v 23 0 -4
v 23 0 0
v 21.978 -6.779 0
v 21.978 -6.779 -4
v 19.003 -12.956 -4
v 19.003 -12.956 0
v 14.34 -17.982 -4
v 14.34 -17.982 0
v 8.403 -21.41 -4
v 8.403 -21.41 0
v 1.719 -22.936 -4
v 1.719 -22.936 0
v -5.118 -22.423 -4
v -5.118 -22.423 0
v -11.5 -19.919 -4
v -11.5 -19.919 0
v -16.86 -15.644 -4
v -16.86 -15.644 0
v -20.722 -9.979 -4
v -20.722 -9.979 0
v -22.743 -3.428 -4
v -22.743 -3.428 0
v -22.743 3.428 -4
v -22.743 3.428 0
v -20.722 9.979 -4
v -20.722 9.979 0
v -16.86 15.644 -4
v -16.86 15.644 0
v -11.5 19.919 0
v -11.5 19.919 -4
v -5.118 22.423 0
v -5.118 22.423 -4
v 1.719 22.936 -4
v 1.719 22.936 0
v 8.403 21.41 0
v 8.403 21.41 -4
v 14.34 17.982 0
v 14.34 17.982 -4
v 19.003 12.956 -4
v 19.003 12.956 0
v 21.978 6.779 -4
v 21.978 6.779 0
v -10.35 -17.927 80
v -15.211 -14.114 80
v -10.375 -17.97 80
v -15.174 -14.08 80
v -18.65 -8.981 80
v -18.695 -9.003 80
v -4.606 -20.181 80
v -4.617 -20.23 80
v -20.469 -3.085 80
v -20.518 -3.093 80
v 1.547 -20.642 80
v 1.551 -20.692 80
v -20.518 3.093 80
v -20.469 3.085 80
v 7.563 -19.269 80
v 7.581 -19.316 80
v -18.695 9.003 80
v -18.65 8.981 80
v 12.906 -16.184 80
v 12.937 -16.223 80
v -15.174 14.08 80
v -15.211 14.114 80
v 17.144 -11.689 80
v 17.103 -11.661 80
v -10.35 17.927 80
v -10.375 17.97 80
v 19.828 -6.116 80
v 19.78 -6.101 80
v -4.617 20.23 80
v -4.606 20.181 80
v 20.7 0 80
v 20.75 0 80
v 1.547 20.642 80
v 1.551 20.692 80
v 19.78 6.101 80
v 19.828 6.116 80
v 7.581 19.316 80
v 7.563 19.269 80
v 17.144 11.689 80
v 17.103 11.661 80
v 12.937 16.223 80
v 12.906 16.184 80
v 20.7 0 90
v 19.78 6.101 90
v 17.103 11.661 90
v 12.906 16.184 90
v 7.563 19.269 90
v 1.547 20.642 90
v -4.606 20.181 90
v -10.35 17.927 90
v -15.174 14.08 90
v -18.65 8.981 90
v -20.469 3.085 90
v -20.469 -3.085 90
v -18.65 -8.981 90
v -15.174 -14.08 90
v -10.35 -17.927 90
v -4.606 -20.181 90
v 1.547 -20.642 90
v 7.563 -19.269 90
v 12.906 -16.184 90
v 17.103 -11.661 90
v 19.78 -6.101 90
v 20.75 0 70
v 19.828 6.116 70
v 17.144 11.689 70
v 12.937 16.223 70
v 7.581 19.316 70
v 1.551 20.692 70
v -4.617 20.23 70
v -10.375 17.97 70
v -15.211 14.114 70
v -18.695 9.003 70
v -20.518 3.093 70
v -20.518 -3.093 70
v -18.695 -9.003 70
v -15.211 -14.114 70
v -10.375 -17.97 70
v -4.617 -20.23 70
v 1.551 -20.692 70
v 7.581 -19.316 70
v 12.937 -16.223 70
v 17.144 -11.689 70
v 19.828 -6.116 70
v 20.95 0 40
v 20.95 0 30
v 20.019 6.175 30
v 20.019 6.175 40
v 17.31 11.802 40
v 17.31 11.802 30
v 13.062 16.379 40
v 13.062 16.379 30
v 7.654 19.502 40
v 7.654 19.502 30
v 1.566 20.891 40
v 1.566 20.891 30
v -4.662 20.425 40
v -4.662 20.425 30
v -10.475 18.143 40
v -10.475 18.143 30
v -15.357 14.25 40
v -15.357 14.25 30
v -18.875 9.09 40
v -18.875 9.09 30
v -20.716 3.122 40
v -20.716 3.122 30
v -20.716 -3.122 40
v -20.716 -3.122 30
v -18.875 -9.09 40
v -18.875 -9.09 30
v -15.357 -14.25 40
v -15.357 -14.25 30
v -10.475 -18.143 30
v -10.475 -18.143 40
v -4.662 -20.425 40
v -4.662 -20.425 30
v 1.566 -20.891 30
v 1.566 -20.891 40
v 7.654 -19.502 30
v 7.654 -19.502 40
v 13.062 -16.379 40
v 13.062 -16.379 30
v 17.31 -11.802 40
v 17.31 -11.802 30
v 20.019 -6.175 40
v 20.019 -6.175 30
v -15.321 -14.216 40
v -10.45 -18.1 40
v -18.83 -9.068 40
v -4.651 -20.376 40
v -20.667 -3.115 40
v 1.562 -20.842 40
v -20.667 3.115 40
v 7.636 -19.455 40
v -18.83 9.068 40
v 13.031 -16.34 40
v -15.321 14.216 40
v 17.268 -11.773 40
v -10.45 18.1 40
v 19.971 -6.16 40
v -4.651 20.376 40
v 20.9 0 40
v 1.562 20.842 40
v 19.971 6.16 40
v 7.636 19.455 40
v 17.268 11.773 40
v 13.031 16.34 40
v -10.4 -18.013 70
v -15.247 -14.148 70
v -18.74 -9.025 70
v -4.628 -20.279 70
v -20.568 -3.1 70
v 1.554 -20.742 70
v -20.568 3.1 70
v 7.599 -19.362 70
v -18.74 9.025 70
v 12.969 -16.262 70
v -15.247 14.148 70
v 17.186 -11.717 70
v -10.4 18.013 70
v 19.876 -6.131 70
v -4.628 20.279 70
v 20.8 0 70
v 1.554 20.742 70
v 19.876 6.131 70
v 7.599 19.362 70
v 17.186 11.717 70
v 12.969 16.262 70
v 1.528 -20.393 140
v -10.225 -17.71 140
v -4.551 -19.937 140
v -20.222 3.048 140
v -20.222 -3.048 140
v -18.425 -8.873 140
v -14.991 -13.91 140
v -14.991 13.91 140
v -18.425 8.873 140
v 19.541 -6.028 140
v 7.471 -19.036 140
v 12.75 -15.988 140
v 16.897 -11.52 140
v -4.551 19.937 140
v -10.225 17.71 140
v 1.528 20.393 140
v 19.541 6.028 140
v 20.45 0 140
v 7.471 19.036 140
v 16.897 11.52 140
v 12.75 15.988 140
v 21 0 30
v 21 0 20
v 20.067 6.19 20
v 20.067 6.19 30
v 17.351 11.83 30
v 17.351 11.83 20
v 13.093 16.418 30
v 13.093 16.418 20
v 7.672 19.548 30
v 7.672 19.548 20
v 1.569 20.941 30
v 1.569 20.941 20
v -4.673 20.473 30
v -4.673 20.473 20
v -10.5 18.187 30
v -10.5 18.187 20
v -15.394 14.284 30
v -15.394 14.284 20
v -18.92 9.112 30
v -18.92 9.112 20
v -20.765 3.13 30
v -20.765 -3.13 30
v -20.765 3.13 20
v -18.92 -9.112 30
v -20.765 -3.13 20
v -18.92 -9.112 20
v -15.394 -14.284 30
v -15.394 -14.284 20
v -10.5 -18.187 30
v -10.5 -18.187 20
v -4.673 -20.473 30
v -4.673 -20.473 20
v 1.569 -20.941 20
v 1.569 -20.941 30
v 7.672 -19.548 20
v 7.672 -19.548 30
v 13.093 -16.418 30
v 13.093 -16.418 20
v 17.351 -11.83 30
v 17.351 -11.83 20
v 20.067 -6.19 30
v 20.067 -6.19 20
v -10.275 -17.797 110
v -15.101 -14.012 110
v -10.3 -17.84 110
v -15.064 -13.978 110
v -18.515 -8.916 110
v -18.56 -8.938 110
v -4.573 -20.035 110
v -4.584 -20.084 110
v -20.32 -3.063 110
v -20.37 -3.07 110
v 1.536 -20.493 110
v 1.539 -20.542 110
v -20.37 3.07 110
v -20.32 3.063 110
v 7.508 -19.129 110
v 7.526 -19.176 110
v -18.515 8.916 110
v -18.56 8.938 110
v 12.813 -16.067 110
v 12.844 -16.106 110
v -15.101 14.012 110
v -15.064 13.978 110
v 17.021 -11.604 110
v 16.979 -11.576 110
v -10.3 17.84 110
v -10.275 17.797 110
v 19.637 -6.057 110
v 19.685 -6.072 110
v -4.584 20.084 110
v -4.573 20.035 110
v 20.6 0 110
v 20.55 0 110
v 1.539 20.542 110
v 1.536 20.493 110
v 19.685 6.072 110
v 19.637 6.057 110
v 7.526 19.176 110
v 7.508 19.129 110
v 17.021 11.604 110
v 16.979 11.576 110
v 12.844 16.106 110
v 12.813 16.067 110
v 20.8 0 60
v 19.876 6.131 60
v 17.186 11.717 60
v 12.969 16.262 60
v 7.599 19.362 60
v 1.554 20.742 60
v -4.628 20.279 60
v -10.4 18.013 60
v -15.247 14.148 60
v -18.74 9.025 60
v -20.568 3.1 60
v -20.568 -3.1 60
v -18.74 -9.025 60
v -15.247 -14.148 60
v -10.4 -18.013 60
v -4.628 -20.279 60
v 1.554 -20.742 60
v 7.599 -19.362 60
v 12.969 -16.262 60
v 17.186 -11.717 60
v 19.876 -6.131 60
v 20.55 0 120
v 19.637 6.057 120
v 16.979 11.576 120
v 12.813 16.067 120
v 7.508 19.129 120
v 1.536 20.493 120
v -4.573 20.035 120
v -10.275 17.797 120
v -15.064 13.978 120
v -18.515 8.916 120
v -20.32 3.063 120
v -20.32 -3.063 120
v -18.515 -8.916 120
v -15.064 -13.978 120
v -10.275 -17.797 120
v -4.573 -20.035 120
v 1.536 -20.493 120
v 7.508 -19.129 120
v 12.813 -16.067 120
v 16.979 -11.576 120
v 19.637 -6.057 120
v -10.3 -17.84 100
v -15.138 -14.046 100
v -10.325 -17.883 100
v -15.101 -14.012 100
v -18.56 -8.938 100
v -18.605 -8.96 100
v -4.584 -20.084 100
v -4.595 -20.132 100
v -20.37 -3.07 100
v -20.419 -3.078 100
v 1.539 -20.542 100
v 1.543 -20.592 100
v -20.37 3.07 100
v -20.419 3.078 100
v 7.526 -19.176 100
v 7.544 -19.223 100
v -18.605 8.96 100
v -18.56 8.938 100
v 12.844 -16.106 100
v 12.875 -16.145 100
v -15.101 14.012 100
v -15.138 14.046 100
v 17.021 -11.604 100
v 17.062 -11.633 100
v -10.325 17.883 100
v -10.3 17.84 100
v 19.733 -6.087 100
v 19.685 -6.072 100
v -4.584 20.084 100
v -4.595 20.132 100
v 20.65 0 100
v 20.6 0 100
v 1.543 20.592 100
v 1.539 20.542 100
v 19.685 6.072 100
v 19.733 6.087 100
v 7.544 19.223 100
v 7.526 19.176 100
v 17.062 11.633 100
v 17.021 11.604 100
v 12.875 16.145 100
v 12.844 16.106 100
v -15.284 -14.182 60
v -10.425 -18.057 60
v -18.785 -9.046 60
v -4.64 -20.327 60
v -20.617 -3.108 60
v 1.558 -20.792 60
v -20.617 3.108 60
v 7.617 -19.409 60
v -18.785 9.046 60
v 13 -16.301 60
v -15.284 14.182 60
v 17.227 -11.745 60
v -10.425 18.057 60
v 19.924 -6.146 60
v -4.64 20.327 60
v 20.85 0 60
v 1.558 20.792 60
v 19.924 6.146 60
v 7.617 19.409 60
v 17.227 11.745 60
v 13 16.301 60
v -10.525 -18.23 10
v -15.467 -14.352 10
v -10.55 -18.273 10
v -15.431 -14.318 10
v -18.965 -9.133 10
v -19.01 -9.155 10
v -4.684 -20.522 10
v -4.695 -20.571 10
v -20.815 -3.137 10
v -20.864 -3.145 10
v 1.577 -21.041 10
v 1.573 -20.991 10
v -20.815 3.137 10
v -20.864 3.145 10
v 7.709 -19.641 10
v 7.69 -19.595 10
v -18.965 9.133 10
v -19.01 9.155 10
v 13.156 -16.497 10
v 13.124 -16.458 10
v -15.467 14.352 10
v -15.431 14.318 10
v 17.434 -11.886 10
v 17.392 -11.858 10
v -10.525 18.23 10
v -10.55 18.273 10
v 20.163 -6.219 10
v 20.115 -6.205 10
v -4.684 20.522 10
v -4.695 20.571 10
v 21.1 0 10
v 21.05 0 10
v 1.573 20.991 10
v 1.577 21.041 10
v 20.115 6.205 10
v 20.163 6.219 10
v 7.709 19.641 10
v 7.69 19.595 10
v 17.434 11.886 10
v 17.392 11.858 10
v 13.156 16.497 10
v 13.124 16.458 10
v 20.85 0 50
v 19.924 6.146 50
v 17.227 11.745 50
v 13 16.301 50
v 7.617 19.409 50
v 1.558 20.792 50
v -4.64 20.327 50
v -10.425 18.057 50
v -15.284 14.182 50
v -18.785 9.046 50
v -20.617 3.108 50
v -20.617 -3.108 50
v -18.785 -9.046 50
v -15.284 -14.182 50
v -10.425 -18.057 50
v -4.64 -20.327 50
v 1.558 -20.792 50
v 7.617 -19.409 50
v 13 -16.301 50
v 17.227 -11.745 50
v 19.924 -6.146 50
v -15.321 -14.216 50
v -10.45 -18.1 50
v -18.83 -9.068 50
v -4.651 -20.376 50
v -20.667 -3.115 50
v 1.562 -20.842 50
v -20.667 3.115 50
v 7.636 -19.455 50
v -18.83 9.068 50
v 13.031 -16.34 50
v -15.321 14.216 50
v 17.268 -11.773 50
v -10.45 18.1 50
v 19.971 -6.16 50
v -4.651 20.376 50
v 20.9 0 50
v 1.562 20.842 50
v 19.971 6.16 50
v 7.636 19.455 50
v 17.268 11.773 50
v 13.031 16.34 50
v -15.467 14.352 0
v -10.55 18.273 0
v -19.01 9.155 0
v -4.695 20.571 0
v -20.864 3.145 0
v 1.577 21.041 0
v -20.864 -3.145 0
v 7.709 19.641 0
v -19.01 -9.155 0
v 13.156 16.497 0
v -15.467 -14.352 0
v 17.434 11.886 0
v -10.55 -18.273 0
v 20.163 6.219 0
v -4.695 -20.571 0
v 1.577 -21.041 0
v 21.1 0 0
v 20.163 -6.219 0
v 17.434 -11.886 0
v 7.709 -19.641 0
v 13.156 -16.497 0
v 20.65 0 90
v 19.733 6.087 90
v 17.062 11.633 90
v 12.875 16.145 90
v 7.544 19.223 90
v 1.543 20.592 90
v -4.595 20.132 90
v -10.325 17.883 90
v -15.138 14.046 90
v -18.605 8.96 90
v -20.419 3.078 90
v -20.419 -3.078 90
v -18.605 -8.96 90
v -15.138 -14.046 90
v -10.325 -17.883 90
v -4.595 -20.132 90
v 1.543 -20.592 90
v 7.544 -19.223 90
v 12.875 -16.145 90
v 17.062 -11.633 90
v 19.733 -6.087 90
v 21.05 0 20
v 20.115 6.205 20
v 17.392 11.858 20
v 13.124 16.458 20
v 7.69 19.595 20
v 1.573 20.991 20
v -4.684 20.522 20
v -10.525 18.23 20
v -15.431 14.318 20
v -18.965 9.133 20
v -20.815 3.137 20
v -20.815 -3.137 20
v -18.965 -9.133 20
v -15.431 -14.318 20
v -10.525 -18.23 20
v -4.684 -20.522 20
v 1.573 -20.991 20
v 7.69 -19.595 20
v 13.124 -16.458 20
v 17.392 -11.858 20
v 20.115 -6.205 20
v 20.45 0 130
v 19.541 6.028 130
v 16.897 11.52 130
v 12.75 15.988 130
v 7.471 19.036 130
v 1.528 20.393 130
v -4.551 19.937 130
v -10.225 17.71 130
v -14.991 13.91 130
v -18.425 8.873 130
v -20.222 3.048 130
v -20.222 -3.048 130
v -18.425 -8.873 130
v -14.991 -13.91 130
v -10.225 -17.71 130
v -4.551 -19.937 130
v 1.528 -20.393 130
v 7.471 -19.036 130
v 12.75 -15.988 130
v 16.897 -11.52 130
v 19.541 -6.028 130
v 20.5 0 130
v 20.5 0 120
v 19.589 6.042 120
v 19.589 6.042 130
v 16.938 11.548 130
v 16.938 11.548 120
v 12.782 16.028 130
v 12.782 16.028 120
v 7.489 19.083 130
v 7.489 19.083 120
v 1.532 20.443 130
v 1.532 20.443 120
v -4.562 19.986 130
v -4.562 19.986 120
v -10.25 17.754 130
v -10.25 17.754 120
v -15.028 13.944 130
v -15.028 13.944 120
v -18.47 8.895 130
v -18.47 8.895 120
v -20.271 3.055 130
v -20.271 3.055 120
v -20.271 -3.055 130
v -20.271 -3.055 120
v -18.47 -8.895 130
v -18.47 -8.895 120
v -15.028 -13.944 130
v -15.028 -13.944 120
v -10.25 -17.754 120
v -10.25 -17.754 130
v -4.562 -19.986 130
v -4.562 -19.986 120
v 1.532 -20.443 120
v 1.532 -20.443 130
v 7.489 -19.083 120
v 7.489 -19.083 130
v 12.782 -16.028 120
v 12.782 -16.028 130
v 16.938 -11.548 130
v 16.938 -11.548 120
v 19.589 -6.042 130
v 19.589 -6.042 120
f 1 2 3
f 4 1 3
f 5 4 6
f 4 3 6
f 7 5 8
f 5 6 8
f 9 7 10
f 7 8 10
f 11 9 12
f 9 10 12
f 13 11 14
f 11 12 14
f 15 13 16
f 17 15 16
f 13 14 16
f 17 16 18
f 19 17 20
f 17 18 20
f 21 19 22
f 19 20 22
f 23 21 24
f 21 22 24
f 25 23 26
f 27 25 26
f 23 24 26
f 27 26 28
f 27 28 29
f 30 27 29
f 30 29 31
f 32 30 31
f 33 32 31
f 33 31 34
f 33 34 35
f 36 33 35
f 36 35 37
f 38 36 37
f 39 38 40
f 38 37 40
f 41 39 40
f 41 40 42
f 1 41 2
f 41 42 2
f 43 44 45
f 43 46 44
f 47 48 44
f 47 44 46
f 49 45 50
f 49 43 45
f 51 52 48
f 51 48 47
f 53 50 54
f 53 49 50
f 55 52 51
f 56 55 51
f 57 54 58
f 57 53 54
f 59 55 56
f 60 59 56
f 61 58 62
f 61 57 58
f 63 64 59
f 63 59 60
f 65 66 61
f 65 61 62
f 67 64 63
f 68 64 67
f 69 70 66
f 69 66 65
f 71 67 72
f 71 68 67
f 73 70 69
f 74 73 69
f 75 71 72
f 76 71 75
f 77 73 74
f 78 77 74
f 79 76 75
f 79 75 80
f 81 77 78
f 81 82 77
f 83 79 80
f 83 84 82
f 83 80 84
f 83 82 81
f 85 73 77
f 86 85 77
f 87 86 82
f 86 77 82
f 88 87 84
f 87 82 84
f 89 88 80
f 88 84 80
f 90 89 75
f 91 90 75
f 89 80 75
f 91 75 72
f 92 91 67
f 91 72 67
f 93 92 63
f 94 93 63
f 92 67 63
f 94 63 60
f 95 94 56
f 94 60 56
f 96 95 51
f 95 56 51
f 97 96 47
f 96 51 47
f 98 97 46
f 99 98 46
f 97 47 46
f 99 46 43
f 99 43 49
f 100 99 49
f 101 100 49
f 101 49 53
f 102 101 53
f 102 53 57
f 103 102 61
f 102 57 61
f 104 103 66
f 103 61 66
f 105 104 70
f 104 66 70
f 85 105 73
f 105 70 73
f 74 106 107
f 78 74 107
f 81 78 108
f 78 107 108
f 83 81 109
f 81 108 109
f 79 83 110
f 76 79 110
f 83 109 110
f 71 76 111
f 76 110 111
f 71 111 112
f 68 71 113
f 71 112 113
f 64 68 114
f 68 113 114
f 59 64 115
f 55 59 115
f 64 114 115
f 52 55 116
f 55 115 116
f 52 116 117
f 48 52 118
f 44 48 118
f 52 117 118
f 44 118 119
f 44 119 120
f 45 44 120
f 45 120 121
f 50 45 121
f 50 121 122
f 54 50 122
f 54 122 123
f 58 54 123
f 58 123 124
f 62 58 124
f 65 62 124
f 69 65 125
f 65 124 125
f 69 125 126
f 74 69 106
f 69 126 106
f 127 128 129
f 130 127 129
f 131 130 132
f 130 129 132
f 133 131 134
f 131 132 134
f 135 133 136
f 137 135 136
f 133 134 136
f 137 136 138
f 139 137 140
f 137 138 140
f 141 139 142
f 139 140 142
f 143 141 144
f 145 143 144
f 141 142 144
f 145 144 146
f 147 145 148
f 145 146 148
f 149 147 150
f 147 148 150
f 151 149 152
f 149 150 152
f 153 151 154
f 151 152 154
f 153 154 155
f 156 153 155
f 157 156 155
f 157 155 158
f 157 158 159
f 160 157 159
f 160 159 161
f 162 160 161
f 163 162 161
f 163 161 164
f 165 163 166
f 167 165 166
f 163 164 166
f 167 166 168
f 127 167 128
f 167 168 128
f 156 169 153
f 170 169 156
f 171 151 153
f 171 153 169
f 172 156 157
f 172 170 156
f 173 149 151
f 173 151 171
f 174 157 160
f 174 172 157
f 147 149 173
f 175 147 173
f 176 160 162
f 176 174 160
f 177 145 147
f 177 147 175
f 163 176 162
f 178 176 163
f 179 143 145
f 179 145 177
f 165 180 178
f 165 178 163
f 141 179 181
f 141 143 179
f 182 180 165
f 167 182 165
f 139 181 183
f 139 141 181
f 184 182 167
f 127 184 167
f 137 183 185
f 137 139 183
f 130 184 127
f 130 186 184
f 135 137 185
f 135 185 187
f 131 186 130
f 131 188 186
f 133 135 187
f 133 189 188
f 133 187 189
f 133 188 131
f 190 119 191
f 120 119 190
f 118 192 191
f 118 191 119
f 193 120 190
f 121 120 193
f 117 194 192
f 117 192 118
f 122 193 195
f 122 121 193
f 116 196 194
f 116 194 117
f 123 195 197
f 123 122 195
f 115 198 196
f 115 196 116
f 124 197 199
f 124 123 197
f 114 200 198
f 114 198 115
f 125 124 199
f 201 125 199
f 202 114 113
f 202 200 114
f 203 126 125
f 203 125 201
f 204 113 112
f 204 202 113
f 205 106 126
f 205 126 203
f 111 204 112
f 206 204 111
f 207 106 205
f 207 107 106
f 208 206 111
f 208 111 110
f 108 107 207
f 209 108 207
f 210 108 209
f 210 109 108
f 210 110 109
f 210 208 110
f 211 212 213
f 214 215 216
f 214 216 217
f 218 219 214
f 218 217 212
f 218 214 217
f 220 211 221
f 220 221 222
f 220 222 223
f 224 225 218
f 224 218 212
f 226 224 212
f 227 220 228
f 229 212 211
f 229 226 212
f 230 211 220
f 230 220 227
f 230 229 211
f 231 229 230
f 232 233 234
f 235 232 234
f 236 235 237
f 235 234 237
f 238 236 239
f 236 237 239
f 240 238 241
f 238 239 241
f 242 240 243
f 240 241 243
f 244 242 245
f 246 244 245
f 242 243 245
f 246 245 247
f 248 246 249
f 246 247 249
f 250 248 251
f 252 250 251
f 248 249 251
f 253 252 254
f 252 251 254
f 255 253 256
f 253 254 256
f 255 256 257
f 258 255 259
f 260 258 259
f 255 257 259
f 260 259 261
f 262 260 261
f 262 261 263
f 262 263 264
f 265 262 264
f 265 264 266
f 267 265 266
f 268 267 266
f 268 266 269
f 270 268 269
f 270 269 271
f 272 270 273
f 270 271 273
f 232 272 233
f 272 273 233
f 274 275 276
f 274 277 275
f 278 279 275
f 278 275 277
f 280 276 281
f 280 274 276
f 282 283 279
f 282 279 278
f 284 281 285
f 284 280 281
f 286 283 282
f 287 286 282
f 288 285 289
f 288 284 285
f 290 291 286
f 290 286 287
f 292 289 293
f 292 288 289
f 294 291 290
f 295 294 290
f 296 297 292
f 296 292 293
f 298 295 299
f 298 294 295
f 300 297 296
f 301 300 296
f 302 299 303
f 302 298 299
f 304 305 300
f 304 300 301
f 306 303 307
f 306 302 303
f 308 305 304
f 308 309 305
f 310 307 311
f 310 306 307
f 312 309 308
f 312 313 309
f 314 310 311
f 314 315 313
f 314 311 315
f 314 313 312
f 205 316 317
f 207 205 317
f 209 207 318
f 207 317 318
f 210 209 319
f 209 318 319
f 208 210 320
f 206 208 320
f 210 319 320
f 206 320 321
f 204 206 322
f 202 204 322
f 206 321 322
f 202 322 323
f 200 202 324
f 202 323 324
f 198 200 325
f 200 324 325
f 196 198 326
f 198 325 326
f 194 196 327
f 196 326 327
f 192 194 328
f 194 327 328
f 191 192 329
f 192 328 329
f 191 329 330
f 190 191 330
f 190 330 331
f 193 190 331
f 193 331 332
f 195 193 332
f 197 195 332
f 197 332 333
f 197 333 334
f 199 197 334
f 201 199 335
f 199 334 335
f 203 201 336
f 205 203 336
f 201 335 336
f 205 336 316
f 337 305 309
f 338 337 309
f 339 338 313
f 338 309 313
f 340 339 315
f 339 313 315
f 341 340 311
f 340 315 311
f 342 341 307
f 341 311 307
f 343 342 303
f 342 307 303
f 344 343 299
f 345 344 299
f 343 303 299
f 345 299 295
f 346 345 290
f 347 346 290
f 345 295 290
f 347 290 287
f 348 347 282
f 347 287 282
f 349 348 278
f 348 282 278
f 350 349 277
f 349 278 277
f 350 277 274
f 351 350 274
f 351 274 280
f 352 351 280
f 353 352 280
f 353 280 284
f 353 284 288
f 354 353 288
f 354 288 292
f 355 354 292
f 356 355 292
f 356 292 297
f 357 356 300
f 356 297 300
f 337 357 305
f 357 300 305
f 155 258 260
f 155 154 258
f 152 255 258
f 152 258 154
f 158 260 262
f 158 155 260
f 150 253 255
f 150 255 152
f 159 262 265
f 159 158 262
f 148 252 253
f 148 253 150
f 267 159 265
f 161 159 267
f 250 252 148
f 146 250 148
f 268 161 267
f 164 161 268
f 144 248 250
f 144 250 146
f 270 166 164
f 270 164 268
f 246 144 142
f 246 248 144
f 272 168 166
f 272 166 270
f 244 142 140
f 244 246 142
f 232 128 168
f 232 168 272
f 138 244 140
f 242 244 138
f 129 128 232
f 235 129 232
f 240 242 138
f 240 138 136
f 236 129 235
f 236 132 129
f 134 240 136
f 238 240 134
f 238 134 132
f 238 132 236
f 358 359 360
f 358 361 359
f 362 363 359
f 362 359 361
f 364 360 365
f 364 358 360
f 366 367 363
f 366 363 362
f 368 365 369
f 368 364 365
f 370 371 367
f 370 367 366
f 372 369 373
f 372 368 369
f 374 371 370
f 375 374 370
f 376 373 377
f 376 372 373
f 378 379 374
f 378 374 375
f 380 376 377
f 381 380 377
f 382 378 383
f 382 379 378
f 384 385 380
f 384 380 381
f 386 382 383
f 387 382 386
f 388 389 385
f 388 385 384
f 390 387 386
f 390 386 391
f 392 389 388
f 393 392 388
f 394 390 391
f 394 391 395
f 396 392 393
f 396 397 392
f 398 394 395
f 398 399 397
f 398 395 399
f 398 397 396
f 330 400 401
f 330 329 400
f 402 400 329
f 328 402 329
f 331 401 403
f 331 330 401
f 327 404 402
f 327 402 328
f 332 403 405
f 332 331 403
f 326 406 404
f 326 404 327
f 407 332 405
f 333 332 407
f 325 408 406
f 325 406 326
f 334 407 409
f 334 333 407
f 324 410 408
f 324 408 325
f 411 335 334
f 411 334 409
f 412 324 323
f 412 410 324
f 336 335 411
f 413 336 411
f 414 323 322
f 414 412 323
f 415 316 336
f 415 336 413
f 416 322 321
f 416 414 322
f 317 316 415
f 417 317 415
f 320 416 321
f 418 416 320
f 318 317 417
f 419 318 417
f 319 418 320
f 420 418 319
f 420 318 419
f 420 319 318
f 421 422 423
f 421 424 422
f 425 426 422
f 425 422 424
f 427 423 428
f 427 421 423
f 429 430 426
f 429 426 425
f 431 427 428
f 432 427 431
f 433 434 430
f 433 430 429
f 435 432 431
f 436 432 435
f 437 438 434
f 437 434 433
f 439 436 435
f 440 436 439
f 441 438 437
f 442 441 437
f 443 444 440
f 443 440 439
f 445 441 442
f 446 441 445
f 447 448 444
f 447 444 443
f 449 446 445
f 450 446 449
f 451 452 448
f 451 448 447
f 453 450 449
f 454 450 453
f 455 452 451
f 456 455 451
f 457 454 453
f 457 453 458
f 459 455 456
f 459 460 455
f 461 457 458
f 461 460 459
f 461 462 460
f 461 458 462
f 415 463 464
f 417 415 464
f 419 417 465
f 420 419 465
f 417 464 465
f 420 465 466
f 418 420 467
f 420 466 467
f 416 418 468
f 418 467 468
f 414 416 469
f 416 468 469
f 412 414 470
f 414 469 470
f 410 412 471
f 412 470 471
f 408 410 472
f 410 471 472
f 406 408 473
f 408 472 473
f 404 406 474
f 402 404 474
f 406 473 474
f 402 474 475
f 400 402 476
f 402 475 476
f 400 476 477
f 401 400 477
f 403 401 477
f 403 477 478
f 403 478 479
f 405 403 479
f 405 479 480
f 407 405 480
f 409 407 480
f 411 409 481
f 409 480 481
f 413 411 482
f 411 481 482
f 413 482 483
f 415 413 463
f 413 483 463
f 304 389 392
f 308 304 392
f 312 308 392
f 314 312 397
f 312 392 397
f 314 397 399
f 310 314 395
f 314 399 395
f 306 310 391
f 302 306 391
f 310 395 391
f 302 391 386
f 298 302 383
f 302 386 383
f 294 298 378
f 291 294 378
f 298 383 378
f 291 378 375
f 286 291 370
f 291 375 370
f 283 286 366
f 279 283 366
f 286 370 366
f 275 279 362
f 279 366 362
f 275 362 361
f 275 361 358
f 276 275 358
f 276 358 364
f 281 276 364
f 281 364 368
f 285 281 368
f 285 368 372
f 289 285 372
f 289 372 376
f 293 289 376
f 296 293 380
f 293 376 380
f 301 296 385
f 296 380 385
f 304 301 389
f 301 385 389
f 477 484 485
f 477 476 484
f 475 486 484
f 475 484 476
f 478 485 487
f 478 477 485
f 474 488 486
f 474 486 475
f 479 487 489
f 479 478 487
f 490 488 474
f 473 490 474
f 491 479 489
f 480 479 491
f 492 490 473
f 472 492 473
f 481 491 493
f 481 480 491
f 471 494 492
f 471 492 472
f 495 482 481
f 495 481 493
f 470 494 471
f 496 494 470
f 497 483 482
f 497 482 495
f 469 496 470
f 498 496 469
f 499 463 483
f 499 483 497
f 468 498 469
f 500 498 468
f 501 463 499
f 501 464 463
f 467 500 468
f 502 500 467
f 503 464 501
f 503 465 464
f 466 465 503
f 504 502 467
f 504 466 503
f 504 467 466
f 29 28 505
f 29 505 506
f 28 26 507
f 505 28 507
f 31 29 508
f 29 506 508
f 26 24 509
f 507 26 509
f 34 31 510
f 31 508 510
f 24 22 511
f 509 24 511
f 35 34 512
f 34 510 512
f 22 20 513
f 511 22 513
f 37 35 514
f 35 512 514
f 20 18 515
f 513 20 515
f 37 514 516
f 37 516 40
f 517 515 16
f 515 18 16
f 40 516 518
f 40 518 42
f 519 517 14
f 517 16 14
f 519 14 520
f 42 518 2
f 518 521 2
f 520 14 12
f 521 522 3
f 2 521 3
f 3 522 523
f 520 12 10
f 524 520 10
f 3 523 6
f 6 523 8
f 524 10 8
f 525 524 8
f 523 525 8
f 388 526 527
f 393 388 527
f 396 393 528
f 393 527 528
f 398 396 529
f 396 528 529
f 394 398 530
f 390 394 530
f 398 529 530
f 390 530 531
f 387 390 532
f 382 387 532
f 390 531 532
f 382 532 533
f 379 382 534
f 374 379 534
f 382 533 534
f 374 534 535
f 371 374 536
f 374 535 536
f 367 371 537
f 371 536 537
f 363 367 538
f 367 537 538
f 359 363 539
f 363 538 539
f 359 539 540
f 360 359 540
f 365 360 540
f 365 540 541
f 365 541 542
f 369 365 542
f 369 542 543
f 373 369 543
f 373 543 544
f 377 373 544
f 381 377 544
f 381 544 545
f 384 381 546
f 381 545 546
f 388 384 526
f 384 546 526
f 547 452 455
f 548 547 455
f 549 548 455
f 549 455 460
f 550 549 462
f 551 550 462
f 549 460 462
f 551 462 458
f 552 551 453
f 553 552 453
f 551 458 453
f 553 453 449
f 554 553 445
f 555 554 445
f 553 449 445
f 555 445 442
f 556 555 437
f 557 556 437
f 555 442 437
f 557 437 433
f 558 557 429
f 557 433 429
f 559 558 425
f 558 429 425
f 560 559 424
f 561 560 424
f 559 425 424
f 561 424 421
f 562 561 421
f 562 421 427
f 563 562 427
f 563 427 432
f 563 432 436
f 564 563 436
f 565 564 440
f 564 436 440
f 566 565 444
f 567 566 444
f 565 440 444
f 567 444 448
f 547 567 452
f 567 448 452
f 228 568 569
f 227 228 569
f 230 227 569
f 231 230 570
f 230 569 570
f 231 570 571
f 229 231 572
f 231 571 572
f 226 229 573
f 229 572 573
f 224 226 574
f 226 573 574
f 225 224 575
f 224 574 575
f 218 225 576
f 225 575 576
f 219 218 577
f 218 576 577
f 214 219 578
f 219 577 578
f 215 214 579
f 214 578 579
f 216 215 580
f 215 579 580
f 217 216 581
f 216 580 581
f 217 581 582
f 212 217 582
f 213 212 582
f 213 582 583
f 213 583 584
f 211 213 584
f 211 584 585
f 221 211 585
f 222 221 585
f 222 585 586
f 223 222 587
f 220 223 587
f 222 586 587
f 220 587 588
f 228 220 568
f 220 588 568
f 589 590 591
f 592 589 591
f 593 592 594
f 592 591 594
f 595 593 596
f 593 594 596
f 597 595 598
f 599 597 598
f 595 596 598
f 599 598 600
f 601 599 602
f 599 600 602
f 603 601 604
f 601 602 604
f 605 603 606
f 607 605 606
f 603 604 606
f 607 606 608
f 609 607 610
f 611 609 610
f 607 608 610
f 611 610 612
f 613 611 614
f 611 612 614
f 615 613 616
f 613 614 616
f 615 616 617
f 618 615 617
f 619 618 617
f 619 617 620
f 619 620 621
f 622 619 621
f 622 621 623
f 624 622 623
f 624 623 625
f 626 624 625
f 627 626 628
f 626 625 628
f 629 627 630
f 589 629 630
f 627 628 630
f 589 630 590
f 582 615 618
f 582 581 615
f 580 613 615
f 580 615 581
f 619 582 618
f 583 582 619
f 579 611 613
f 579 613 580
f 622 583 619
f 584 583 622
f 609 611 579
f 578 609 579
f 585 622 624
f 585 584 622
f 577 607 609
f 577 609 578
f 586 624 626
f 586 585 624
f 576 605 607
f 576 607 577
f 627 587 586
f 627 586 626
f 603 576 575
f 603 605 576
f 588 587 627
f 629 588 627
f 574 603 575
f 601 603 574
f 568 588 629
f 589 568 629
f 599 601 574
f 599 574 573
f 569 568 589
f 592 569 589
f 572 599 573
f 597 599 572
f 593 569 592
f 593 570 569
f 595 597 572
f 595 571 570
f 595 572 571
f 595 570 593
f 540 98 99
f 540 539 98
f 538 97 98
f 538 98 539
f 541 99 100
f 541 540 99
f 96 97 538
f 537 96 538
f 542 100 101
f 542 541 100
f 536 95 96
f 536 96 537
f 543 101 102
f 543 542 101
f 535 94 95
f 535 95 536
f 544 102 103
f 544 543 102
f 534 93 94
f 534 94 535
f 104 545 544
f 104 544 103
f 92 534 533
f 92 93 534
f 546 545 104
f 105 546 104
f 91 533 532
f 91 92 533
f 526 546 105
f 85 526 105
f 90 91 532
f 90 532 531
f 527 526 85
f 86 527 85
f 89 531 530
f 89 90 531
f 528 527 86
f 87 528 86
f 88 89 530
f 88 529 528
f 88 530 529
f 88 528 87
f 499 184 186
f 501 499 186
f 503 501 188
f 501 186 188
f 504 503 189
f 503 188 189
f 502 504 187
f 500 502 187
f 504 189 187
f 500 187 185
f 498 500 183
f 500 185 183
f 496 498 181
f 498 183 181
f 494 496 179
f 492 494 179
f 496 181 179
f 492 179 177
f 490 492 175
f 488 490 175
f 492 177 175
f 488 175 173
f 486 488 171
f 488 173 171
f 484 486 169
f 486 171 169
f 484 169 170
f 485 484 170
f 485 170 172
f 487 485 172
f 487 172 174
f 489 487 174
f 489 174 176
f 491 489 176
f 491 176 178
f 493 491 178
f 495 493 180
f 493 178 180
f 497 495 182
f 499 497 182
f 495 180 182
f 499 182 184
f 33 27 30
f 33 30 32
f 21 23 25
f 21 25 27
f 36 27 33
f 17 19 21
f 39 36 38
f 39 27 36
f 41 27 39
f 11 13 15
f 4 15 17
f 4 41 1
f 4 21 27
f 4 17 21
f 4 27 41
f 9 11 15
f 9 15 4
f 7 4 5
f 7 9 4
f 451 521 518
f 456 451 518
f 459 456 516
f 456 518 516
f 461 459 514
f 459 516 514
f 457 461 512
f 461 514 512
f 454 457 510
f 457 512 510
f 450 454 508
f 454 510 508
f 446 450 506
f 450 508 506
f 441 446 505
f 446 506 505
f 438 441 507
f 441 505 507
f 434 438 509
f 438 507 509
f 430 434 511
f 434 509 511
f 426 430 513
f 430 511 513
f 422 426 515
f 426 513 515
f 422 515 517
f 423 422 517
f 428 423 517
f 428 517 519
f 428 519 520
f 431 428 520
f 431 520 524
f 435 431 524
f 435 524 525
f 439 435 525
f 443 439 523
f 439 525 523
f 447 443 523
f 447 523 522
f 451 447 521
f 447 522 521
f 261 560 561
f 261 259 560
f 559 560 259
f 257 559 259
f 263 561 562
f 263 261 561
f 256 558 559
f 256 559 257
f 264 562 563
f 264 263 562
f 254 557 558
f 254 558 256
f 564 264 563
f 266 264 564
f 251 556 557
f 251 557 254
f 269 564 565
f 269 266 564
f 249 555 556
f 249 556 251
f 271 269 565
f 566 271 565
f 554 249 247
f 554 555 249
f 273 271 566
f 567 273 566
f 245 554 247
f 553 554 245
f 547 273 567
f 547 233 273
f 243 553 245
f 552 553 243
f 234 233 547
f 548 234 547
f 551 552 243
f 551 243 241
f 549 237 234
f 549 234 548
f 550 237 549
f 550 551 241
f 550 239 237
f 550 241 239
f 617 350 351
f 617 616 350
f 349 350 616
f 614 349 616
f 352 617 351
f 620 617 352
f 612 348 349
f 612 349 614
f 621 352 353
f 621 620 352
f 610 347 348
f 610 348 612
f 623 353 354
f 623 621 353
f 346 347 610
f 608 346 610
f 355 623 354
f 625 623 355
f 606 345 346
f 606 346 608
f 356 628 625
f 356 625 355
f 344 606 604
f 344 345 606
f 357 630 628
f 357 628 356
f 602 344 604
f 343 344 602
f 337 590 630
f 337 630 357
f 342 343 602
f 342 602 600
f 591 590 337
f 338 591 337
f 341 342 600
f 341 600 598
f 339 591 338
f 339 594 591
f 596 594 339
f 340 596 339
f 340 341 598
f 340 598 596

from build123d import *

# Parameters (mm, degrees)
F0_R      = 21.1
F1_DEPTH  = 10
F2_R      = 21.05
F3_DEPTH  = 10
F4_R      = 21
F5_DEPTH  = 10
F6_R      = 20.95
F7_DEPTH  = 10
F8_R      = 23
F8_R_2    = 21.1
F9_DEPTH  = 4
F10_R     = 20.9
F11_DEPTH = 10
F12_R     = 20.85
F13_DEPTH = 10
F14_R     = 20.8
F15_DEPTH = 10
F16_R     = 20.75
F17_DEPTH = 10
F18_R     = 20.7
F19_DEPTH = 10
F20_R     = 20.65
F21_DEPTH = 10
F22_R     = 20.6
F23_DEPTH = 10
F24_R     = 20.55
F25_DEPTH = 10
F26_R     = 20.5
F27_DEPTH = 10
F28_R     = 20.45
F29_DEPTH = 10


with BuildPart() as f1:
    # F0 (on Top) → F1 (new body)
    with BuildSketch(Plane.XY):
        Circle(F0_R)
    extrude(amount=F1_DEPTH)

    # F2 (on face) → F3 (join)
    with BuildSketch(Plane.XY.offset(10)):
        Circle(F2_R)
    extrude(amount=F3_DEPTH)

    # F4 (on face) → F5 (join)
    with BuildSketch(Plane.XY.offset(20)):
        Circle(F4_R)
    extrude(amount=F5_DEPTH)

    # F6 (on face) → F7 (join)
    with BuildSketch(Plane.XY.offset(30)):
        Circle(F6_R)
    extrude(amount=F7_DEPTH)

    # F8 (on face) → F9 (join)
    with BuildSketch(Plane(origin=(0, 0, 0), x_dir=(1, 0, 0), z_dir=(0, 0, -1))):
        Circle(F8_R)
        Circle(F8_R_2, mode=Mode.SUBTRACT)
        Circle(F8_R_2)
    extrude(amount=F9_DEPTH)

    # F10 (on face) → F11 (join)
    with BuildSketch(Plane.XY.offset(40)):
        Circle(F10_R)
    extrude(amount=F11_DEPTH)

    # F12 (on face) → F13 (join)
    with BuildSketch(Plane.XY.offset(50)):
        Circle(F12_R)
    extrude(amount=F13_DEPTH)

    # F14 (on face) → F15 (join)
    with BuildSketch(Plane.XY.offset(60)):
        Circle(F14_R)
    extrude(amount=F15_DEPTH)

    # F16 (on face) → F17 (join)
    with BuildSketch(Plane.XY.offset(70)):
        Circle(F16_R)
    extrude(amount=F17_DEPTH)

    # F18 (on face) → F19 (join)
    with BuildSketch(Plane.XY.offset(80)):
        Circle(F18_R)
    extrude(amount=F19_DEPTH)

    # F20 (on face) → F21 (join)
    with BuildSketch(Plane.XY.offset(90)):
        Circle(F20_R)
    extrude(amount=F21_DEPTH)

    # F22 (on face) → F23 (join)
    with BuildSketch(Plane.XY.offset(100)):
        Circle(F22_R)
    extrude(amount=F23_DEPTH)

    # F24 (on face) → F25 (join)
    with BuildSketch(Plane.XY.offset(110)):
        Circle(F24_R)
    extrude(amount=F25_DEPTH)

    # F26 (on face) → F27 (join)
    with BuildSketch(Plane.XY.offset(120)):
        Circle(F26_R)
    extrude(amount=F27_DEPTH)

    # F28 (on face) → F29 (join)
    with BuildSketch(Plane.XY.offset(130)):
        Circle(F28_R)
    extrude(amount=F29_DEPTH)


solid = f1.part
